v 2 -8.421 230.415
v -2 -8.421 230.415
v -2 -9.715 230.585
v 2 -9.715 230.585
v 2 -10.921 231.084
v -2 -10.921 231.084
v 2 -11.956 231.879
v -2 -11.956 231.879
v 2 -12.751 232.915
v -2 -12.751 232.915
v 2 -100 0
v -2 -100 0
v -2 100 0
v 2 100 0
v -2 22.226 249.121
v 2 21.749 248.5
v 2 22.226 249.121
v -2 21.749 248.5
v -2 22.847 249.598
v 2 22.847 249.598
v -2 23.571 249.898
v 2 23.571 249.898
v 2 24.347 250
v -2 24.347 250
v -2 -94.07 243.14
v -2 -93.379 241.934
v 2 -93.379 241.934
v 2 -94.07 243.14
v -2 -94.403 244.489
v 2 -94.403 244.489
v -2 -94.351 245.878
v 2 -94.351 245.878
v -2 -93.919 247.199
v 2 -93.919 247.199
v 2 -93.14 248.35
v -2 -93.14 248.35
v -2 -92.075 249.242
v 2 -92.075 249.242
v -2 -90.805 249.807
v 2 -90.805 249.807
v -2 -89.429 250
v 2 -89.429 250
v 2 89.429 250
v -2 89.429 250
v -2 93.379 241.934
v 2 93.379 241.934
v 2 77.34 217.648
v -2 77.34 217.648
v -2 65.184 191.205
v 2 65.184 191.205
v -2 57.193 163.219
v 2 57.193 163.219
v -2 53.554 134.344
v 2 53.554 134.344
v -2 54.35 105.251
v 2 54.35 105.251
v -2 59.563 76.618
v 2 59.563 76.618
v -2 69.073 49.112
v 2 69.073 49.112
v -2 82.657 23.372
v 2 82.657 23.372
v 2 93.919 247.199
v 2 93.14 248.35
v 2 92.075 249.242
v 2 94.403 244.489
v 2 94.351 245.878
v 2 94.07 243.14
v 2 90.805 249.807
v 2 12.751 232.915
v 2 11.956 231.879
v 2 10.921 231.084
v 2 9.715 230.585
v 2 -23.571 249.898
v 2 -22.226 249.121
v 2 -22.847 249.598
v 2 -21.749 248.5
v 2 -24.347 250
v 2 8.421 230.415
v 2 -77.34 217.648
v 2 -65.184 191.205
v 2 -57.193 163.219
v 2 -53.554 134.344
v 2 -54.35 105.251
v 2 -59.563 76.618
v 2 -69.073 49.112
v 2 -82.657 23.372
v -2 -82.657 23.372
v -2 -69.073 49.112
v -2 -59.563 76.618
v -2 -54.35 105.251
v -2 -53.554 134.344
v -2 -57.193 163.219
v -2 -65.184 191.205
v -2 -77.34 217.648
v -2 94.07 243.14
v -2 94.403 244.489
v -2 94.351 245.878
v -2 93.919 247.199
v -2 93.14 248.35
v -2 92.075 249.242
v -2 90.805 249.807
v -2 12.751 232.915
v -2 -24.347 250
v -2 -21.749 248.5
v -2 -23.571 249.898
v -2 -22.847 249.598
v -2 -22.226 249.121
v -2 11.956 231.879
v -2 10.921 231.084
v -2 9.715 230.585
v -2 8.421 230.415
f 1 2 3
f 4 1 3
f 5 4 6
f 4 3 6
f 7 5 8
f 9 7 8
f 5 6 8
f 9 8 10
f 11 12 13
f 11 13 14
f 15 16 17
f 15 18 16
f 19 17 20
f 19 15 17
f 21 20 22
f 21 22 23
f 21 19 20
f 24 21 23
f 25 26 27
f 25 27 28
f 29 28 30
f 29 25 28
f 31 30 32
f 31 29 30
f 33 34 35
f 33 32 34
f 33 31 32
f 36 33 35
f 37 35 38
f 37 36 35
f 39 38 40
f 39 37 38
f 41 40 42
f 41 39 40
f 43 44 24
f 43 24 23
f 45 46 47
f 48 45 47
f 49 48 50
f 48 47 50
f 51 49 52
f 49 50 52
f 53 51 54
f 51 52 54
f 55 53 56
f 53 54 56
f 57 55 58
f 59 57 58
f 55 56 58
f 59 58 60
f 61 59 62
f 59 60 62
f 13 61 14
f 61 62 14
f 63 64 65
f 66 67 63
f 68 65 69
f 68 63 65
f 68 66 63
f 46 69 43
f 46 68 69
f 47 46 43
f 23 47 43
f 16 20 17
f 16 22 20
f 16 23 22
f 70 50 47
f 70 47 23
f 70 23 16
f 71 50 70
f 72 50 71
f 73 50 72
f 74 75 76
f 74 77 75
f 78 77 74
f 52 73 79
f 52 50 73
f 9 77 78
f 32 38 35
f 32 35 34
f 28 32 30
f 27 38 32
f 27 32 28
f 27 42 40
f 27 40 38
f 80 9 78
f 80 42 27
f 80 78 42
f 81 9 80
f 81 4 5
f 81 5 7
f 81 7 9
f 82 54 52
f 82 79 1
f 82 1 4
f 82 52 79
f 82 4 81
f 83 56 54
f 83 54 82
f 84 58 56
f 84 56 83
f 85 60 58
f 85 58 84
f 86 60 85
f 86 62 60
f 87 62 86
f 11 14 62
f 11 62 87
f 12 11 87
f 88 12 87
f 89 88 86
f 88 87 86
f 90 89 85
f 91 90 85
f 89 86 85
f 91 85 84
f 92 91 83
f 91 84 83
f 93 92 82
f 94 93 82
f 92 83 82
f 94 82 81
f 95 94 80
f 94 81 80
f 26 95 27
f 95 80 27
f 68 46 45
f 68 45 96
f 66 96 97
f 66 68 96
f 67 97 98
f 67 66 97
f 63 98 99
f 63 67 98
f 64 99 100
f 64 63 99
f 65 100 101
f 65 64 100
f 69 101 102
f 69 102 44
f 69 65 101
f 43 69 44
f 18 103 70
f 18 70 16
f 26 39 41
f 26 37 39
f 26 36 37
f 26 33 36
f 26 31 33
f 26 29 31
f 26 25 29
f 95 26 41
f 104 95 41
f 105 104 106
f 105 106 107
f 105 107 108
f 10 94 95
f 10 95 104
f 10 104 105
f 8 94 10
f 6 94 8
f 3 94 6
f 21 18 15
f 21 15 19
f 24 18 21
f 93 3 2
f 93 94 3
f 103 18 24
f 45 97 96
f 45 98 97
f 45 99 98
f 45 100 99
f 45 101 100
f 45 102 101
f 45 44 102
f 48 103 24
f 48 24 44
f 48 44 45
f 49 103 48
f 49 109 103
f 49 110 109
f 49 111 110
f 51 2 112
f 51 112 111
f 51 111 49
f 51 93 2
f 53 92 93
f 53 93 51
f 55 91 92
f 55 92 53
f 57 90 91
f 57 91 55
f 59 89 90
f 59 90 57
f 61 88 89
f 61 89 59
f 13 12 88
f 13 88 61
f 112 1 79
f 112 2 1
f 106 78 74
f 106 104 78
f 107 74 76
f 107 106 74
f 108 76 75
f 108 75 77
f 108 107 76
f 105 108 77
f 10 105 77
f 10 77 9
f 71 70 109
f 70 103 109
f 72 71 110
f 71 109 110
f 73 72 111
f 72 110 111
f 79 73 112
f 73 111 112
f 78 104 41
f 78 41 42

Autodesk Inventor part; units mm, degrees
ref_plane "YZ Plane" through (0, 0, 0) normal (1, 0, 0) x (0, 1, 0)
ref_plane "XZ Plane" through (0, 0, 0) normal (0, 1, 0) x (-1, 0, 0)
ref_plane "XY Plane" through (0, 0, 0) normal (0, 0, 1) x (1, 0, 0)
sketch "Эскиз1" plane through (0, 0, 0) normal (0, 0, 1) x (1, 0, 0)
  line L0 (2, -100) -> (-2, -100)
  line L1 (-2, -100) -> (-2, 100)
  line L2 (-2, 100) -> (2, 100)
  line L3 (2, 100) -> (2, -100)
  line L4 (2, -100) -> (-2, 100) construction
  line L5 (-2, -100) -> (2, 100) construction
  point P0 (0, 0)
  dimension "d0" = 4
  dimension "d1" = 200
extrude "Выдавливание1" add sketch "Эскиз1" along normal blind 250
sketch "Эскиз2" plane through (-2, -100, 0) normal (-1, 0, 0) x (0, 0, 1)
  line L0 (250, 200) -> (250, 0) projected
  line L1 (0, 0) -> (250, 0) projected
  line L2 (0, 102) -> (250, 102) projected
  point P0 (0, 100)
sketch "Эскиз3" plane through (2, -100, 0) normal (1, 0, 0) x (0, 0, -1)
  line L0 (0, 0) -> (0, 200) construction
  line L1 (0, 200) -> (-250, 200) construction
  line L2 (-250, 0) -> (-250, 200) construction
  line L3 (0, 0) -> (-250, 0) construction
  line L4 (-250, 200) -> (-250, 0) construction
  line L5 (-250, 0) -> (0, 200) construction
  line L6 (0, 100) -> (-250, 100) construction
  line L7 (0, 200) -> (-250, 200) projected
  arc A0 (-250, 200) -> (0, 200) centre (-125, 344.0414) ccw
  arc A1 (0, 0) -> (-250, 0) centre (-125, -144.0414) ccw
  line L8 (-250, 0) -> (0, 0)
extrude "Выдавливание2" cut sketch "Эскиз3" against normal blind 4
fillet "Сопряжение1" radius 5 1 edges at (0, 100, 250)
fillet "Сопряжение2" radius 5 1 edges at (0, -100, 250)
sketch "Эскиз4" plane through (-2, -100, 0) normal (-1, 0, 0) x (0, 0, 1)
  arc A0 (250, 189.4287) -> (241.9343, 193.3786) centre (245, 189.4287) ccw projected
  arc A1 (241.9343, 6.6214) -> (250, 10.5713) centre (245, 10.5713) ccw projected
  line L0 (248.5, 78.2507) -> (232.9146, 87.249)
  line L1 (230.4146, 91.5791) -> (230.4146, 108.4209)
  line L2 (232.9146, 112.751) -> (248.5, 121.7493)
  arc A2 (232.9146, 112.751) -> (230.4146, 108.4209) centre (235.4146, 108.4209) ccw
  arc A3 (230.4146, 91.5791) -> (232.9146, 87.249) centre (235.4146, 91.5791) ccw
  arc A4 (248.5, 121.7493) -> (250, 124.3473) centre (247, 124.3473) ccw
  arc A5 (250, 75.6527) -> (248.5, 78.2507) centre (247, 75.6527) ccw
  line L3 (250, 124.3473) -> (250, 75.6527)
  line L4 (250, 10.5713) -> (250, 189.4287) projected
  point P0 (0, 100)
  point P1 (250, 100)
  point P2 (250, 77.3847)
  point P3 (230.4146, 88.6924)
  point P4 (230.4146, 111.3076)
  point P5 (250, 122.6153)
  dimension "d8" = 5
  dimension "d9" = 3
extrude "Выдавливание3" cut sketch "Эскиз4" against normal blind 4
properties part number "грань тела"
